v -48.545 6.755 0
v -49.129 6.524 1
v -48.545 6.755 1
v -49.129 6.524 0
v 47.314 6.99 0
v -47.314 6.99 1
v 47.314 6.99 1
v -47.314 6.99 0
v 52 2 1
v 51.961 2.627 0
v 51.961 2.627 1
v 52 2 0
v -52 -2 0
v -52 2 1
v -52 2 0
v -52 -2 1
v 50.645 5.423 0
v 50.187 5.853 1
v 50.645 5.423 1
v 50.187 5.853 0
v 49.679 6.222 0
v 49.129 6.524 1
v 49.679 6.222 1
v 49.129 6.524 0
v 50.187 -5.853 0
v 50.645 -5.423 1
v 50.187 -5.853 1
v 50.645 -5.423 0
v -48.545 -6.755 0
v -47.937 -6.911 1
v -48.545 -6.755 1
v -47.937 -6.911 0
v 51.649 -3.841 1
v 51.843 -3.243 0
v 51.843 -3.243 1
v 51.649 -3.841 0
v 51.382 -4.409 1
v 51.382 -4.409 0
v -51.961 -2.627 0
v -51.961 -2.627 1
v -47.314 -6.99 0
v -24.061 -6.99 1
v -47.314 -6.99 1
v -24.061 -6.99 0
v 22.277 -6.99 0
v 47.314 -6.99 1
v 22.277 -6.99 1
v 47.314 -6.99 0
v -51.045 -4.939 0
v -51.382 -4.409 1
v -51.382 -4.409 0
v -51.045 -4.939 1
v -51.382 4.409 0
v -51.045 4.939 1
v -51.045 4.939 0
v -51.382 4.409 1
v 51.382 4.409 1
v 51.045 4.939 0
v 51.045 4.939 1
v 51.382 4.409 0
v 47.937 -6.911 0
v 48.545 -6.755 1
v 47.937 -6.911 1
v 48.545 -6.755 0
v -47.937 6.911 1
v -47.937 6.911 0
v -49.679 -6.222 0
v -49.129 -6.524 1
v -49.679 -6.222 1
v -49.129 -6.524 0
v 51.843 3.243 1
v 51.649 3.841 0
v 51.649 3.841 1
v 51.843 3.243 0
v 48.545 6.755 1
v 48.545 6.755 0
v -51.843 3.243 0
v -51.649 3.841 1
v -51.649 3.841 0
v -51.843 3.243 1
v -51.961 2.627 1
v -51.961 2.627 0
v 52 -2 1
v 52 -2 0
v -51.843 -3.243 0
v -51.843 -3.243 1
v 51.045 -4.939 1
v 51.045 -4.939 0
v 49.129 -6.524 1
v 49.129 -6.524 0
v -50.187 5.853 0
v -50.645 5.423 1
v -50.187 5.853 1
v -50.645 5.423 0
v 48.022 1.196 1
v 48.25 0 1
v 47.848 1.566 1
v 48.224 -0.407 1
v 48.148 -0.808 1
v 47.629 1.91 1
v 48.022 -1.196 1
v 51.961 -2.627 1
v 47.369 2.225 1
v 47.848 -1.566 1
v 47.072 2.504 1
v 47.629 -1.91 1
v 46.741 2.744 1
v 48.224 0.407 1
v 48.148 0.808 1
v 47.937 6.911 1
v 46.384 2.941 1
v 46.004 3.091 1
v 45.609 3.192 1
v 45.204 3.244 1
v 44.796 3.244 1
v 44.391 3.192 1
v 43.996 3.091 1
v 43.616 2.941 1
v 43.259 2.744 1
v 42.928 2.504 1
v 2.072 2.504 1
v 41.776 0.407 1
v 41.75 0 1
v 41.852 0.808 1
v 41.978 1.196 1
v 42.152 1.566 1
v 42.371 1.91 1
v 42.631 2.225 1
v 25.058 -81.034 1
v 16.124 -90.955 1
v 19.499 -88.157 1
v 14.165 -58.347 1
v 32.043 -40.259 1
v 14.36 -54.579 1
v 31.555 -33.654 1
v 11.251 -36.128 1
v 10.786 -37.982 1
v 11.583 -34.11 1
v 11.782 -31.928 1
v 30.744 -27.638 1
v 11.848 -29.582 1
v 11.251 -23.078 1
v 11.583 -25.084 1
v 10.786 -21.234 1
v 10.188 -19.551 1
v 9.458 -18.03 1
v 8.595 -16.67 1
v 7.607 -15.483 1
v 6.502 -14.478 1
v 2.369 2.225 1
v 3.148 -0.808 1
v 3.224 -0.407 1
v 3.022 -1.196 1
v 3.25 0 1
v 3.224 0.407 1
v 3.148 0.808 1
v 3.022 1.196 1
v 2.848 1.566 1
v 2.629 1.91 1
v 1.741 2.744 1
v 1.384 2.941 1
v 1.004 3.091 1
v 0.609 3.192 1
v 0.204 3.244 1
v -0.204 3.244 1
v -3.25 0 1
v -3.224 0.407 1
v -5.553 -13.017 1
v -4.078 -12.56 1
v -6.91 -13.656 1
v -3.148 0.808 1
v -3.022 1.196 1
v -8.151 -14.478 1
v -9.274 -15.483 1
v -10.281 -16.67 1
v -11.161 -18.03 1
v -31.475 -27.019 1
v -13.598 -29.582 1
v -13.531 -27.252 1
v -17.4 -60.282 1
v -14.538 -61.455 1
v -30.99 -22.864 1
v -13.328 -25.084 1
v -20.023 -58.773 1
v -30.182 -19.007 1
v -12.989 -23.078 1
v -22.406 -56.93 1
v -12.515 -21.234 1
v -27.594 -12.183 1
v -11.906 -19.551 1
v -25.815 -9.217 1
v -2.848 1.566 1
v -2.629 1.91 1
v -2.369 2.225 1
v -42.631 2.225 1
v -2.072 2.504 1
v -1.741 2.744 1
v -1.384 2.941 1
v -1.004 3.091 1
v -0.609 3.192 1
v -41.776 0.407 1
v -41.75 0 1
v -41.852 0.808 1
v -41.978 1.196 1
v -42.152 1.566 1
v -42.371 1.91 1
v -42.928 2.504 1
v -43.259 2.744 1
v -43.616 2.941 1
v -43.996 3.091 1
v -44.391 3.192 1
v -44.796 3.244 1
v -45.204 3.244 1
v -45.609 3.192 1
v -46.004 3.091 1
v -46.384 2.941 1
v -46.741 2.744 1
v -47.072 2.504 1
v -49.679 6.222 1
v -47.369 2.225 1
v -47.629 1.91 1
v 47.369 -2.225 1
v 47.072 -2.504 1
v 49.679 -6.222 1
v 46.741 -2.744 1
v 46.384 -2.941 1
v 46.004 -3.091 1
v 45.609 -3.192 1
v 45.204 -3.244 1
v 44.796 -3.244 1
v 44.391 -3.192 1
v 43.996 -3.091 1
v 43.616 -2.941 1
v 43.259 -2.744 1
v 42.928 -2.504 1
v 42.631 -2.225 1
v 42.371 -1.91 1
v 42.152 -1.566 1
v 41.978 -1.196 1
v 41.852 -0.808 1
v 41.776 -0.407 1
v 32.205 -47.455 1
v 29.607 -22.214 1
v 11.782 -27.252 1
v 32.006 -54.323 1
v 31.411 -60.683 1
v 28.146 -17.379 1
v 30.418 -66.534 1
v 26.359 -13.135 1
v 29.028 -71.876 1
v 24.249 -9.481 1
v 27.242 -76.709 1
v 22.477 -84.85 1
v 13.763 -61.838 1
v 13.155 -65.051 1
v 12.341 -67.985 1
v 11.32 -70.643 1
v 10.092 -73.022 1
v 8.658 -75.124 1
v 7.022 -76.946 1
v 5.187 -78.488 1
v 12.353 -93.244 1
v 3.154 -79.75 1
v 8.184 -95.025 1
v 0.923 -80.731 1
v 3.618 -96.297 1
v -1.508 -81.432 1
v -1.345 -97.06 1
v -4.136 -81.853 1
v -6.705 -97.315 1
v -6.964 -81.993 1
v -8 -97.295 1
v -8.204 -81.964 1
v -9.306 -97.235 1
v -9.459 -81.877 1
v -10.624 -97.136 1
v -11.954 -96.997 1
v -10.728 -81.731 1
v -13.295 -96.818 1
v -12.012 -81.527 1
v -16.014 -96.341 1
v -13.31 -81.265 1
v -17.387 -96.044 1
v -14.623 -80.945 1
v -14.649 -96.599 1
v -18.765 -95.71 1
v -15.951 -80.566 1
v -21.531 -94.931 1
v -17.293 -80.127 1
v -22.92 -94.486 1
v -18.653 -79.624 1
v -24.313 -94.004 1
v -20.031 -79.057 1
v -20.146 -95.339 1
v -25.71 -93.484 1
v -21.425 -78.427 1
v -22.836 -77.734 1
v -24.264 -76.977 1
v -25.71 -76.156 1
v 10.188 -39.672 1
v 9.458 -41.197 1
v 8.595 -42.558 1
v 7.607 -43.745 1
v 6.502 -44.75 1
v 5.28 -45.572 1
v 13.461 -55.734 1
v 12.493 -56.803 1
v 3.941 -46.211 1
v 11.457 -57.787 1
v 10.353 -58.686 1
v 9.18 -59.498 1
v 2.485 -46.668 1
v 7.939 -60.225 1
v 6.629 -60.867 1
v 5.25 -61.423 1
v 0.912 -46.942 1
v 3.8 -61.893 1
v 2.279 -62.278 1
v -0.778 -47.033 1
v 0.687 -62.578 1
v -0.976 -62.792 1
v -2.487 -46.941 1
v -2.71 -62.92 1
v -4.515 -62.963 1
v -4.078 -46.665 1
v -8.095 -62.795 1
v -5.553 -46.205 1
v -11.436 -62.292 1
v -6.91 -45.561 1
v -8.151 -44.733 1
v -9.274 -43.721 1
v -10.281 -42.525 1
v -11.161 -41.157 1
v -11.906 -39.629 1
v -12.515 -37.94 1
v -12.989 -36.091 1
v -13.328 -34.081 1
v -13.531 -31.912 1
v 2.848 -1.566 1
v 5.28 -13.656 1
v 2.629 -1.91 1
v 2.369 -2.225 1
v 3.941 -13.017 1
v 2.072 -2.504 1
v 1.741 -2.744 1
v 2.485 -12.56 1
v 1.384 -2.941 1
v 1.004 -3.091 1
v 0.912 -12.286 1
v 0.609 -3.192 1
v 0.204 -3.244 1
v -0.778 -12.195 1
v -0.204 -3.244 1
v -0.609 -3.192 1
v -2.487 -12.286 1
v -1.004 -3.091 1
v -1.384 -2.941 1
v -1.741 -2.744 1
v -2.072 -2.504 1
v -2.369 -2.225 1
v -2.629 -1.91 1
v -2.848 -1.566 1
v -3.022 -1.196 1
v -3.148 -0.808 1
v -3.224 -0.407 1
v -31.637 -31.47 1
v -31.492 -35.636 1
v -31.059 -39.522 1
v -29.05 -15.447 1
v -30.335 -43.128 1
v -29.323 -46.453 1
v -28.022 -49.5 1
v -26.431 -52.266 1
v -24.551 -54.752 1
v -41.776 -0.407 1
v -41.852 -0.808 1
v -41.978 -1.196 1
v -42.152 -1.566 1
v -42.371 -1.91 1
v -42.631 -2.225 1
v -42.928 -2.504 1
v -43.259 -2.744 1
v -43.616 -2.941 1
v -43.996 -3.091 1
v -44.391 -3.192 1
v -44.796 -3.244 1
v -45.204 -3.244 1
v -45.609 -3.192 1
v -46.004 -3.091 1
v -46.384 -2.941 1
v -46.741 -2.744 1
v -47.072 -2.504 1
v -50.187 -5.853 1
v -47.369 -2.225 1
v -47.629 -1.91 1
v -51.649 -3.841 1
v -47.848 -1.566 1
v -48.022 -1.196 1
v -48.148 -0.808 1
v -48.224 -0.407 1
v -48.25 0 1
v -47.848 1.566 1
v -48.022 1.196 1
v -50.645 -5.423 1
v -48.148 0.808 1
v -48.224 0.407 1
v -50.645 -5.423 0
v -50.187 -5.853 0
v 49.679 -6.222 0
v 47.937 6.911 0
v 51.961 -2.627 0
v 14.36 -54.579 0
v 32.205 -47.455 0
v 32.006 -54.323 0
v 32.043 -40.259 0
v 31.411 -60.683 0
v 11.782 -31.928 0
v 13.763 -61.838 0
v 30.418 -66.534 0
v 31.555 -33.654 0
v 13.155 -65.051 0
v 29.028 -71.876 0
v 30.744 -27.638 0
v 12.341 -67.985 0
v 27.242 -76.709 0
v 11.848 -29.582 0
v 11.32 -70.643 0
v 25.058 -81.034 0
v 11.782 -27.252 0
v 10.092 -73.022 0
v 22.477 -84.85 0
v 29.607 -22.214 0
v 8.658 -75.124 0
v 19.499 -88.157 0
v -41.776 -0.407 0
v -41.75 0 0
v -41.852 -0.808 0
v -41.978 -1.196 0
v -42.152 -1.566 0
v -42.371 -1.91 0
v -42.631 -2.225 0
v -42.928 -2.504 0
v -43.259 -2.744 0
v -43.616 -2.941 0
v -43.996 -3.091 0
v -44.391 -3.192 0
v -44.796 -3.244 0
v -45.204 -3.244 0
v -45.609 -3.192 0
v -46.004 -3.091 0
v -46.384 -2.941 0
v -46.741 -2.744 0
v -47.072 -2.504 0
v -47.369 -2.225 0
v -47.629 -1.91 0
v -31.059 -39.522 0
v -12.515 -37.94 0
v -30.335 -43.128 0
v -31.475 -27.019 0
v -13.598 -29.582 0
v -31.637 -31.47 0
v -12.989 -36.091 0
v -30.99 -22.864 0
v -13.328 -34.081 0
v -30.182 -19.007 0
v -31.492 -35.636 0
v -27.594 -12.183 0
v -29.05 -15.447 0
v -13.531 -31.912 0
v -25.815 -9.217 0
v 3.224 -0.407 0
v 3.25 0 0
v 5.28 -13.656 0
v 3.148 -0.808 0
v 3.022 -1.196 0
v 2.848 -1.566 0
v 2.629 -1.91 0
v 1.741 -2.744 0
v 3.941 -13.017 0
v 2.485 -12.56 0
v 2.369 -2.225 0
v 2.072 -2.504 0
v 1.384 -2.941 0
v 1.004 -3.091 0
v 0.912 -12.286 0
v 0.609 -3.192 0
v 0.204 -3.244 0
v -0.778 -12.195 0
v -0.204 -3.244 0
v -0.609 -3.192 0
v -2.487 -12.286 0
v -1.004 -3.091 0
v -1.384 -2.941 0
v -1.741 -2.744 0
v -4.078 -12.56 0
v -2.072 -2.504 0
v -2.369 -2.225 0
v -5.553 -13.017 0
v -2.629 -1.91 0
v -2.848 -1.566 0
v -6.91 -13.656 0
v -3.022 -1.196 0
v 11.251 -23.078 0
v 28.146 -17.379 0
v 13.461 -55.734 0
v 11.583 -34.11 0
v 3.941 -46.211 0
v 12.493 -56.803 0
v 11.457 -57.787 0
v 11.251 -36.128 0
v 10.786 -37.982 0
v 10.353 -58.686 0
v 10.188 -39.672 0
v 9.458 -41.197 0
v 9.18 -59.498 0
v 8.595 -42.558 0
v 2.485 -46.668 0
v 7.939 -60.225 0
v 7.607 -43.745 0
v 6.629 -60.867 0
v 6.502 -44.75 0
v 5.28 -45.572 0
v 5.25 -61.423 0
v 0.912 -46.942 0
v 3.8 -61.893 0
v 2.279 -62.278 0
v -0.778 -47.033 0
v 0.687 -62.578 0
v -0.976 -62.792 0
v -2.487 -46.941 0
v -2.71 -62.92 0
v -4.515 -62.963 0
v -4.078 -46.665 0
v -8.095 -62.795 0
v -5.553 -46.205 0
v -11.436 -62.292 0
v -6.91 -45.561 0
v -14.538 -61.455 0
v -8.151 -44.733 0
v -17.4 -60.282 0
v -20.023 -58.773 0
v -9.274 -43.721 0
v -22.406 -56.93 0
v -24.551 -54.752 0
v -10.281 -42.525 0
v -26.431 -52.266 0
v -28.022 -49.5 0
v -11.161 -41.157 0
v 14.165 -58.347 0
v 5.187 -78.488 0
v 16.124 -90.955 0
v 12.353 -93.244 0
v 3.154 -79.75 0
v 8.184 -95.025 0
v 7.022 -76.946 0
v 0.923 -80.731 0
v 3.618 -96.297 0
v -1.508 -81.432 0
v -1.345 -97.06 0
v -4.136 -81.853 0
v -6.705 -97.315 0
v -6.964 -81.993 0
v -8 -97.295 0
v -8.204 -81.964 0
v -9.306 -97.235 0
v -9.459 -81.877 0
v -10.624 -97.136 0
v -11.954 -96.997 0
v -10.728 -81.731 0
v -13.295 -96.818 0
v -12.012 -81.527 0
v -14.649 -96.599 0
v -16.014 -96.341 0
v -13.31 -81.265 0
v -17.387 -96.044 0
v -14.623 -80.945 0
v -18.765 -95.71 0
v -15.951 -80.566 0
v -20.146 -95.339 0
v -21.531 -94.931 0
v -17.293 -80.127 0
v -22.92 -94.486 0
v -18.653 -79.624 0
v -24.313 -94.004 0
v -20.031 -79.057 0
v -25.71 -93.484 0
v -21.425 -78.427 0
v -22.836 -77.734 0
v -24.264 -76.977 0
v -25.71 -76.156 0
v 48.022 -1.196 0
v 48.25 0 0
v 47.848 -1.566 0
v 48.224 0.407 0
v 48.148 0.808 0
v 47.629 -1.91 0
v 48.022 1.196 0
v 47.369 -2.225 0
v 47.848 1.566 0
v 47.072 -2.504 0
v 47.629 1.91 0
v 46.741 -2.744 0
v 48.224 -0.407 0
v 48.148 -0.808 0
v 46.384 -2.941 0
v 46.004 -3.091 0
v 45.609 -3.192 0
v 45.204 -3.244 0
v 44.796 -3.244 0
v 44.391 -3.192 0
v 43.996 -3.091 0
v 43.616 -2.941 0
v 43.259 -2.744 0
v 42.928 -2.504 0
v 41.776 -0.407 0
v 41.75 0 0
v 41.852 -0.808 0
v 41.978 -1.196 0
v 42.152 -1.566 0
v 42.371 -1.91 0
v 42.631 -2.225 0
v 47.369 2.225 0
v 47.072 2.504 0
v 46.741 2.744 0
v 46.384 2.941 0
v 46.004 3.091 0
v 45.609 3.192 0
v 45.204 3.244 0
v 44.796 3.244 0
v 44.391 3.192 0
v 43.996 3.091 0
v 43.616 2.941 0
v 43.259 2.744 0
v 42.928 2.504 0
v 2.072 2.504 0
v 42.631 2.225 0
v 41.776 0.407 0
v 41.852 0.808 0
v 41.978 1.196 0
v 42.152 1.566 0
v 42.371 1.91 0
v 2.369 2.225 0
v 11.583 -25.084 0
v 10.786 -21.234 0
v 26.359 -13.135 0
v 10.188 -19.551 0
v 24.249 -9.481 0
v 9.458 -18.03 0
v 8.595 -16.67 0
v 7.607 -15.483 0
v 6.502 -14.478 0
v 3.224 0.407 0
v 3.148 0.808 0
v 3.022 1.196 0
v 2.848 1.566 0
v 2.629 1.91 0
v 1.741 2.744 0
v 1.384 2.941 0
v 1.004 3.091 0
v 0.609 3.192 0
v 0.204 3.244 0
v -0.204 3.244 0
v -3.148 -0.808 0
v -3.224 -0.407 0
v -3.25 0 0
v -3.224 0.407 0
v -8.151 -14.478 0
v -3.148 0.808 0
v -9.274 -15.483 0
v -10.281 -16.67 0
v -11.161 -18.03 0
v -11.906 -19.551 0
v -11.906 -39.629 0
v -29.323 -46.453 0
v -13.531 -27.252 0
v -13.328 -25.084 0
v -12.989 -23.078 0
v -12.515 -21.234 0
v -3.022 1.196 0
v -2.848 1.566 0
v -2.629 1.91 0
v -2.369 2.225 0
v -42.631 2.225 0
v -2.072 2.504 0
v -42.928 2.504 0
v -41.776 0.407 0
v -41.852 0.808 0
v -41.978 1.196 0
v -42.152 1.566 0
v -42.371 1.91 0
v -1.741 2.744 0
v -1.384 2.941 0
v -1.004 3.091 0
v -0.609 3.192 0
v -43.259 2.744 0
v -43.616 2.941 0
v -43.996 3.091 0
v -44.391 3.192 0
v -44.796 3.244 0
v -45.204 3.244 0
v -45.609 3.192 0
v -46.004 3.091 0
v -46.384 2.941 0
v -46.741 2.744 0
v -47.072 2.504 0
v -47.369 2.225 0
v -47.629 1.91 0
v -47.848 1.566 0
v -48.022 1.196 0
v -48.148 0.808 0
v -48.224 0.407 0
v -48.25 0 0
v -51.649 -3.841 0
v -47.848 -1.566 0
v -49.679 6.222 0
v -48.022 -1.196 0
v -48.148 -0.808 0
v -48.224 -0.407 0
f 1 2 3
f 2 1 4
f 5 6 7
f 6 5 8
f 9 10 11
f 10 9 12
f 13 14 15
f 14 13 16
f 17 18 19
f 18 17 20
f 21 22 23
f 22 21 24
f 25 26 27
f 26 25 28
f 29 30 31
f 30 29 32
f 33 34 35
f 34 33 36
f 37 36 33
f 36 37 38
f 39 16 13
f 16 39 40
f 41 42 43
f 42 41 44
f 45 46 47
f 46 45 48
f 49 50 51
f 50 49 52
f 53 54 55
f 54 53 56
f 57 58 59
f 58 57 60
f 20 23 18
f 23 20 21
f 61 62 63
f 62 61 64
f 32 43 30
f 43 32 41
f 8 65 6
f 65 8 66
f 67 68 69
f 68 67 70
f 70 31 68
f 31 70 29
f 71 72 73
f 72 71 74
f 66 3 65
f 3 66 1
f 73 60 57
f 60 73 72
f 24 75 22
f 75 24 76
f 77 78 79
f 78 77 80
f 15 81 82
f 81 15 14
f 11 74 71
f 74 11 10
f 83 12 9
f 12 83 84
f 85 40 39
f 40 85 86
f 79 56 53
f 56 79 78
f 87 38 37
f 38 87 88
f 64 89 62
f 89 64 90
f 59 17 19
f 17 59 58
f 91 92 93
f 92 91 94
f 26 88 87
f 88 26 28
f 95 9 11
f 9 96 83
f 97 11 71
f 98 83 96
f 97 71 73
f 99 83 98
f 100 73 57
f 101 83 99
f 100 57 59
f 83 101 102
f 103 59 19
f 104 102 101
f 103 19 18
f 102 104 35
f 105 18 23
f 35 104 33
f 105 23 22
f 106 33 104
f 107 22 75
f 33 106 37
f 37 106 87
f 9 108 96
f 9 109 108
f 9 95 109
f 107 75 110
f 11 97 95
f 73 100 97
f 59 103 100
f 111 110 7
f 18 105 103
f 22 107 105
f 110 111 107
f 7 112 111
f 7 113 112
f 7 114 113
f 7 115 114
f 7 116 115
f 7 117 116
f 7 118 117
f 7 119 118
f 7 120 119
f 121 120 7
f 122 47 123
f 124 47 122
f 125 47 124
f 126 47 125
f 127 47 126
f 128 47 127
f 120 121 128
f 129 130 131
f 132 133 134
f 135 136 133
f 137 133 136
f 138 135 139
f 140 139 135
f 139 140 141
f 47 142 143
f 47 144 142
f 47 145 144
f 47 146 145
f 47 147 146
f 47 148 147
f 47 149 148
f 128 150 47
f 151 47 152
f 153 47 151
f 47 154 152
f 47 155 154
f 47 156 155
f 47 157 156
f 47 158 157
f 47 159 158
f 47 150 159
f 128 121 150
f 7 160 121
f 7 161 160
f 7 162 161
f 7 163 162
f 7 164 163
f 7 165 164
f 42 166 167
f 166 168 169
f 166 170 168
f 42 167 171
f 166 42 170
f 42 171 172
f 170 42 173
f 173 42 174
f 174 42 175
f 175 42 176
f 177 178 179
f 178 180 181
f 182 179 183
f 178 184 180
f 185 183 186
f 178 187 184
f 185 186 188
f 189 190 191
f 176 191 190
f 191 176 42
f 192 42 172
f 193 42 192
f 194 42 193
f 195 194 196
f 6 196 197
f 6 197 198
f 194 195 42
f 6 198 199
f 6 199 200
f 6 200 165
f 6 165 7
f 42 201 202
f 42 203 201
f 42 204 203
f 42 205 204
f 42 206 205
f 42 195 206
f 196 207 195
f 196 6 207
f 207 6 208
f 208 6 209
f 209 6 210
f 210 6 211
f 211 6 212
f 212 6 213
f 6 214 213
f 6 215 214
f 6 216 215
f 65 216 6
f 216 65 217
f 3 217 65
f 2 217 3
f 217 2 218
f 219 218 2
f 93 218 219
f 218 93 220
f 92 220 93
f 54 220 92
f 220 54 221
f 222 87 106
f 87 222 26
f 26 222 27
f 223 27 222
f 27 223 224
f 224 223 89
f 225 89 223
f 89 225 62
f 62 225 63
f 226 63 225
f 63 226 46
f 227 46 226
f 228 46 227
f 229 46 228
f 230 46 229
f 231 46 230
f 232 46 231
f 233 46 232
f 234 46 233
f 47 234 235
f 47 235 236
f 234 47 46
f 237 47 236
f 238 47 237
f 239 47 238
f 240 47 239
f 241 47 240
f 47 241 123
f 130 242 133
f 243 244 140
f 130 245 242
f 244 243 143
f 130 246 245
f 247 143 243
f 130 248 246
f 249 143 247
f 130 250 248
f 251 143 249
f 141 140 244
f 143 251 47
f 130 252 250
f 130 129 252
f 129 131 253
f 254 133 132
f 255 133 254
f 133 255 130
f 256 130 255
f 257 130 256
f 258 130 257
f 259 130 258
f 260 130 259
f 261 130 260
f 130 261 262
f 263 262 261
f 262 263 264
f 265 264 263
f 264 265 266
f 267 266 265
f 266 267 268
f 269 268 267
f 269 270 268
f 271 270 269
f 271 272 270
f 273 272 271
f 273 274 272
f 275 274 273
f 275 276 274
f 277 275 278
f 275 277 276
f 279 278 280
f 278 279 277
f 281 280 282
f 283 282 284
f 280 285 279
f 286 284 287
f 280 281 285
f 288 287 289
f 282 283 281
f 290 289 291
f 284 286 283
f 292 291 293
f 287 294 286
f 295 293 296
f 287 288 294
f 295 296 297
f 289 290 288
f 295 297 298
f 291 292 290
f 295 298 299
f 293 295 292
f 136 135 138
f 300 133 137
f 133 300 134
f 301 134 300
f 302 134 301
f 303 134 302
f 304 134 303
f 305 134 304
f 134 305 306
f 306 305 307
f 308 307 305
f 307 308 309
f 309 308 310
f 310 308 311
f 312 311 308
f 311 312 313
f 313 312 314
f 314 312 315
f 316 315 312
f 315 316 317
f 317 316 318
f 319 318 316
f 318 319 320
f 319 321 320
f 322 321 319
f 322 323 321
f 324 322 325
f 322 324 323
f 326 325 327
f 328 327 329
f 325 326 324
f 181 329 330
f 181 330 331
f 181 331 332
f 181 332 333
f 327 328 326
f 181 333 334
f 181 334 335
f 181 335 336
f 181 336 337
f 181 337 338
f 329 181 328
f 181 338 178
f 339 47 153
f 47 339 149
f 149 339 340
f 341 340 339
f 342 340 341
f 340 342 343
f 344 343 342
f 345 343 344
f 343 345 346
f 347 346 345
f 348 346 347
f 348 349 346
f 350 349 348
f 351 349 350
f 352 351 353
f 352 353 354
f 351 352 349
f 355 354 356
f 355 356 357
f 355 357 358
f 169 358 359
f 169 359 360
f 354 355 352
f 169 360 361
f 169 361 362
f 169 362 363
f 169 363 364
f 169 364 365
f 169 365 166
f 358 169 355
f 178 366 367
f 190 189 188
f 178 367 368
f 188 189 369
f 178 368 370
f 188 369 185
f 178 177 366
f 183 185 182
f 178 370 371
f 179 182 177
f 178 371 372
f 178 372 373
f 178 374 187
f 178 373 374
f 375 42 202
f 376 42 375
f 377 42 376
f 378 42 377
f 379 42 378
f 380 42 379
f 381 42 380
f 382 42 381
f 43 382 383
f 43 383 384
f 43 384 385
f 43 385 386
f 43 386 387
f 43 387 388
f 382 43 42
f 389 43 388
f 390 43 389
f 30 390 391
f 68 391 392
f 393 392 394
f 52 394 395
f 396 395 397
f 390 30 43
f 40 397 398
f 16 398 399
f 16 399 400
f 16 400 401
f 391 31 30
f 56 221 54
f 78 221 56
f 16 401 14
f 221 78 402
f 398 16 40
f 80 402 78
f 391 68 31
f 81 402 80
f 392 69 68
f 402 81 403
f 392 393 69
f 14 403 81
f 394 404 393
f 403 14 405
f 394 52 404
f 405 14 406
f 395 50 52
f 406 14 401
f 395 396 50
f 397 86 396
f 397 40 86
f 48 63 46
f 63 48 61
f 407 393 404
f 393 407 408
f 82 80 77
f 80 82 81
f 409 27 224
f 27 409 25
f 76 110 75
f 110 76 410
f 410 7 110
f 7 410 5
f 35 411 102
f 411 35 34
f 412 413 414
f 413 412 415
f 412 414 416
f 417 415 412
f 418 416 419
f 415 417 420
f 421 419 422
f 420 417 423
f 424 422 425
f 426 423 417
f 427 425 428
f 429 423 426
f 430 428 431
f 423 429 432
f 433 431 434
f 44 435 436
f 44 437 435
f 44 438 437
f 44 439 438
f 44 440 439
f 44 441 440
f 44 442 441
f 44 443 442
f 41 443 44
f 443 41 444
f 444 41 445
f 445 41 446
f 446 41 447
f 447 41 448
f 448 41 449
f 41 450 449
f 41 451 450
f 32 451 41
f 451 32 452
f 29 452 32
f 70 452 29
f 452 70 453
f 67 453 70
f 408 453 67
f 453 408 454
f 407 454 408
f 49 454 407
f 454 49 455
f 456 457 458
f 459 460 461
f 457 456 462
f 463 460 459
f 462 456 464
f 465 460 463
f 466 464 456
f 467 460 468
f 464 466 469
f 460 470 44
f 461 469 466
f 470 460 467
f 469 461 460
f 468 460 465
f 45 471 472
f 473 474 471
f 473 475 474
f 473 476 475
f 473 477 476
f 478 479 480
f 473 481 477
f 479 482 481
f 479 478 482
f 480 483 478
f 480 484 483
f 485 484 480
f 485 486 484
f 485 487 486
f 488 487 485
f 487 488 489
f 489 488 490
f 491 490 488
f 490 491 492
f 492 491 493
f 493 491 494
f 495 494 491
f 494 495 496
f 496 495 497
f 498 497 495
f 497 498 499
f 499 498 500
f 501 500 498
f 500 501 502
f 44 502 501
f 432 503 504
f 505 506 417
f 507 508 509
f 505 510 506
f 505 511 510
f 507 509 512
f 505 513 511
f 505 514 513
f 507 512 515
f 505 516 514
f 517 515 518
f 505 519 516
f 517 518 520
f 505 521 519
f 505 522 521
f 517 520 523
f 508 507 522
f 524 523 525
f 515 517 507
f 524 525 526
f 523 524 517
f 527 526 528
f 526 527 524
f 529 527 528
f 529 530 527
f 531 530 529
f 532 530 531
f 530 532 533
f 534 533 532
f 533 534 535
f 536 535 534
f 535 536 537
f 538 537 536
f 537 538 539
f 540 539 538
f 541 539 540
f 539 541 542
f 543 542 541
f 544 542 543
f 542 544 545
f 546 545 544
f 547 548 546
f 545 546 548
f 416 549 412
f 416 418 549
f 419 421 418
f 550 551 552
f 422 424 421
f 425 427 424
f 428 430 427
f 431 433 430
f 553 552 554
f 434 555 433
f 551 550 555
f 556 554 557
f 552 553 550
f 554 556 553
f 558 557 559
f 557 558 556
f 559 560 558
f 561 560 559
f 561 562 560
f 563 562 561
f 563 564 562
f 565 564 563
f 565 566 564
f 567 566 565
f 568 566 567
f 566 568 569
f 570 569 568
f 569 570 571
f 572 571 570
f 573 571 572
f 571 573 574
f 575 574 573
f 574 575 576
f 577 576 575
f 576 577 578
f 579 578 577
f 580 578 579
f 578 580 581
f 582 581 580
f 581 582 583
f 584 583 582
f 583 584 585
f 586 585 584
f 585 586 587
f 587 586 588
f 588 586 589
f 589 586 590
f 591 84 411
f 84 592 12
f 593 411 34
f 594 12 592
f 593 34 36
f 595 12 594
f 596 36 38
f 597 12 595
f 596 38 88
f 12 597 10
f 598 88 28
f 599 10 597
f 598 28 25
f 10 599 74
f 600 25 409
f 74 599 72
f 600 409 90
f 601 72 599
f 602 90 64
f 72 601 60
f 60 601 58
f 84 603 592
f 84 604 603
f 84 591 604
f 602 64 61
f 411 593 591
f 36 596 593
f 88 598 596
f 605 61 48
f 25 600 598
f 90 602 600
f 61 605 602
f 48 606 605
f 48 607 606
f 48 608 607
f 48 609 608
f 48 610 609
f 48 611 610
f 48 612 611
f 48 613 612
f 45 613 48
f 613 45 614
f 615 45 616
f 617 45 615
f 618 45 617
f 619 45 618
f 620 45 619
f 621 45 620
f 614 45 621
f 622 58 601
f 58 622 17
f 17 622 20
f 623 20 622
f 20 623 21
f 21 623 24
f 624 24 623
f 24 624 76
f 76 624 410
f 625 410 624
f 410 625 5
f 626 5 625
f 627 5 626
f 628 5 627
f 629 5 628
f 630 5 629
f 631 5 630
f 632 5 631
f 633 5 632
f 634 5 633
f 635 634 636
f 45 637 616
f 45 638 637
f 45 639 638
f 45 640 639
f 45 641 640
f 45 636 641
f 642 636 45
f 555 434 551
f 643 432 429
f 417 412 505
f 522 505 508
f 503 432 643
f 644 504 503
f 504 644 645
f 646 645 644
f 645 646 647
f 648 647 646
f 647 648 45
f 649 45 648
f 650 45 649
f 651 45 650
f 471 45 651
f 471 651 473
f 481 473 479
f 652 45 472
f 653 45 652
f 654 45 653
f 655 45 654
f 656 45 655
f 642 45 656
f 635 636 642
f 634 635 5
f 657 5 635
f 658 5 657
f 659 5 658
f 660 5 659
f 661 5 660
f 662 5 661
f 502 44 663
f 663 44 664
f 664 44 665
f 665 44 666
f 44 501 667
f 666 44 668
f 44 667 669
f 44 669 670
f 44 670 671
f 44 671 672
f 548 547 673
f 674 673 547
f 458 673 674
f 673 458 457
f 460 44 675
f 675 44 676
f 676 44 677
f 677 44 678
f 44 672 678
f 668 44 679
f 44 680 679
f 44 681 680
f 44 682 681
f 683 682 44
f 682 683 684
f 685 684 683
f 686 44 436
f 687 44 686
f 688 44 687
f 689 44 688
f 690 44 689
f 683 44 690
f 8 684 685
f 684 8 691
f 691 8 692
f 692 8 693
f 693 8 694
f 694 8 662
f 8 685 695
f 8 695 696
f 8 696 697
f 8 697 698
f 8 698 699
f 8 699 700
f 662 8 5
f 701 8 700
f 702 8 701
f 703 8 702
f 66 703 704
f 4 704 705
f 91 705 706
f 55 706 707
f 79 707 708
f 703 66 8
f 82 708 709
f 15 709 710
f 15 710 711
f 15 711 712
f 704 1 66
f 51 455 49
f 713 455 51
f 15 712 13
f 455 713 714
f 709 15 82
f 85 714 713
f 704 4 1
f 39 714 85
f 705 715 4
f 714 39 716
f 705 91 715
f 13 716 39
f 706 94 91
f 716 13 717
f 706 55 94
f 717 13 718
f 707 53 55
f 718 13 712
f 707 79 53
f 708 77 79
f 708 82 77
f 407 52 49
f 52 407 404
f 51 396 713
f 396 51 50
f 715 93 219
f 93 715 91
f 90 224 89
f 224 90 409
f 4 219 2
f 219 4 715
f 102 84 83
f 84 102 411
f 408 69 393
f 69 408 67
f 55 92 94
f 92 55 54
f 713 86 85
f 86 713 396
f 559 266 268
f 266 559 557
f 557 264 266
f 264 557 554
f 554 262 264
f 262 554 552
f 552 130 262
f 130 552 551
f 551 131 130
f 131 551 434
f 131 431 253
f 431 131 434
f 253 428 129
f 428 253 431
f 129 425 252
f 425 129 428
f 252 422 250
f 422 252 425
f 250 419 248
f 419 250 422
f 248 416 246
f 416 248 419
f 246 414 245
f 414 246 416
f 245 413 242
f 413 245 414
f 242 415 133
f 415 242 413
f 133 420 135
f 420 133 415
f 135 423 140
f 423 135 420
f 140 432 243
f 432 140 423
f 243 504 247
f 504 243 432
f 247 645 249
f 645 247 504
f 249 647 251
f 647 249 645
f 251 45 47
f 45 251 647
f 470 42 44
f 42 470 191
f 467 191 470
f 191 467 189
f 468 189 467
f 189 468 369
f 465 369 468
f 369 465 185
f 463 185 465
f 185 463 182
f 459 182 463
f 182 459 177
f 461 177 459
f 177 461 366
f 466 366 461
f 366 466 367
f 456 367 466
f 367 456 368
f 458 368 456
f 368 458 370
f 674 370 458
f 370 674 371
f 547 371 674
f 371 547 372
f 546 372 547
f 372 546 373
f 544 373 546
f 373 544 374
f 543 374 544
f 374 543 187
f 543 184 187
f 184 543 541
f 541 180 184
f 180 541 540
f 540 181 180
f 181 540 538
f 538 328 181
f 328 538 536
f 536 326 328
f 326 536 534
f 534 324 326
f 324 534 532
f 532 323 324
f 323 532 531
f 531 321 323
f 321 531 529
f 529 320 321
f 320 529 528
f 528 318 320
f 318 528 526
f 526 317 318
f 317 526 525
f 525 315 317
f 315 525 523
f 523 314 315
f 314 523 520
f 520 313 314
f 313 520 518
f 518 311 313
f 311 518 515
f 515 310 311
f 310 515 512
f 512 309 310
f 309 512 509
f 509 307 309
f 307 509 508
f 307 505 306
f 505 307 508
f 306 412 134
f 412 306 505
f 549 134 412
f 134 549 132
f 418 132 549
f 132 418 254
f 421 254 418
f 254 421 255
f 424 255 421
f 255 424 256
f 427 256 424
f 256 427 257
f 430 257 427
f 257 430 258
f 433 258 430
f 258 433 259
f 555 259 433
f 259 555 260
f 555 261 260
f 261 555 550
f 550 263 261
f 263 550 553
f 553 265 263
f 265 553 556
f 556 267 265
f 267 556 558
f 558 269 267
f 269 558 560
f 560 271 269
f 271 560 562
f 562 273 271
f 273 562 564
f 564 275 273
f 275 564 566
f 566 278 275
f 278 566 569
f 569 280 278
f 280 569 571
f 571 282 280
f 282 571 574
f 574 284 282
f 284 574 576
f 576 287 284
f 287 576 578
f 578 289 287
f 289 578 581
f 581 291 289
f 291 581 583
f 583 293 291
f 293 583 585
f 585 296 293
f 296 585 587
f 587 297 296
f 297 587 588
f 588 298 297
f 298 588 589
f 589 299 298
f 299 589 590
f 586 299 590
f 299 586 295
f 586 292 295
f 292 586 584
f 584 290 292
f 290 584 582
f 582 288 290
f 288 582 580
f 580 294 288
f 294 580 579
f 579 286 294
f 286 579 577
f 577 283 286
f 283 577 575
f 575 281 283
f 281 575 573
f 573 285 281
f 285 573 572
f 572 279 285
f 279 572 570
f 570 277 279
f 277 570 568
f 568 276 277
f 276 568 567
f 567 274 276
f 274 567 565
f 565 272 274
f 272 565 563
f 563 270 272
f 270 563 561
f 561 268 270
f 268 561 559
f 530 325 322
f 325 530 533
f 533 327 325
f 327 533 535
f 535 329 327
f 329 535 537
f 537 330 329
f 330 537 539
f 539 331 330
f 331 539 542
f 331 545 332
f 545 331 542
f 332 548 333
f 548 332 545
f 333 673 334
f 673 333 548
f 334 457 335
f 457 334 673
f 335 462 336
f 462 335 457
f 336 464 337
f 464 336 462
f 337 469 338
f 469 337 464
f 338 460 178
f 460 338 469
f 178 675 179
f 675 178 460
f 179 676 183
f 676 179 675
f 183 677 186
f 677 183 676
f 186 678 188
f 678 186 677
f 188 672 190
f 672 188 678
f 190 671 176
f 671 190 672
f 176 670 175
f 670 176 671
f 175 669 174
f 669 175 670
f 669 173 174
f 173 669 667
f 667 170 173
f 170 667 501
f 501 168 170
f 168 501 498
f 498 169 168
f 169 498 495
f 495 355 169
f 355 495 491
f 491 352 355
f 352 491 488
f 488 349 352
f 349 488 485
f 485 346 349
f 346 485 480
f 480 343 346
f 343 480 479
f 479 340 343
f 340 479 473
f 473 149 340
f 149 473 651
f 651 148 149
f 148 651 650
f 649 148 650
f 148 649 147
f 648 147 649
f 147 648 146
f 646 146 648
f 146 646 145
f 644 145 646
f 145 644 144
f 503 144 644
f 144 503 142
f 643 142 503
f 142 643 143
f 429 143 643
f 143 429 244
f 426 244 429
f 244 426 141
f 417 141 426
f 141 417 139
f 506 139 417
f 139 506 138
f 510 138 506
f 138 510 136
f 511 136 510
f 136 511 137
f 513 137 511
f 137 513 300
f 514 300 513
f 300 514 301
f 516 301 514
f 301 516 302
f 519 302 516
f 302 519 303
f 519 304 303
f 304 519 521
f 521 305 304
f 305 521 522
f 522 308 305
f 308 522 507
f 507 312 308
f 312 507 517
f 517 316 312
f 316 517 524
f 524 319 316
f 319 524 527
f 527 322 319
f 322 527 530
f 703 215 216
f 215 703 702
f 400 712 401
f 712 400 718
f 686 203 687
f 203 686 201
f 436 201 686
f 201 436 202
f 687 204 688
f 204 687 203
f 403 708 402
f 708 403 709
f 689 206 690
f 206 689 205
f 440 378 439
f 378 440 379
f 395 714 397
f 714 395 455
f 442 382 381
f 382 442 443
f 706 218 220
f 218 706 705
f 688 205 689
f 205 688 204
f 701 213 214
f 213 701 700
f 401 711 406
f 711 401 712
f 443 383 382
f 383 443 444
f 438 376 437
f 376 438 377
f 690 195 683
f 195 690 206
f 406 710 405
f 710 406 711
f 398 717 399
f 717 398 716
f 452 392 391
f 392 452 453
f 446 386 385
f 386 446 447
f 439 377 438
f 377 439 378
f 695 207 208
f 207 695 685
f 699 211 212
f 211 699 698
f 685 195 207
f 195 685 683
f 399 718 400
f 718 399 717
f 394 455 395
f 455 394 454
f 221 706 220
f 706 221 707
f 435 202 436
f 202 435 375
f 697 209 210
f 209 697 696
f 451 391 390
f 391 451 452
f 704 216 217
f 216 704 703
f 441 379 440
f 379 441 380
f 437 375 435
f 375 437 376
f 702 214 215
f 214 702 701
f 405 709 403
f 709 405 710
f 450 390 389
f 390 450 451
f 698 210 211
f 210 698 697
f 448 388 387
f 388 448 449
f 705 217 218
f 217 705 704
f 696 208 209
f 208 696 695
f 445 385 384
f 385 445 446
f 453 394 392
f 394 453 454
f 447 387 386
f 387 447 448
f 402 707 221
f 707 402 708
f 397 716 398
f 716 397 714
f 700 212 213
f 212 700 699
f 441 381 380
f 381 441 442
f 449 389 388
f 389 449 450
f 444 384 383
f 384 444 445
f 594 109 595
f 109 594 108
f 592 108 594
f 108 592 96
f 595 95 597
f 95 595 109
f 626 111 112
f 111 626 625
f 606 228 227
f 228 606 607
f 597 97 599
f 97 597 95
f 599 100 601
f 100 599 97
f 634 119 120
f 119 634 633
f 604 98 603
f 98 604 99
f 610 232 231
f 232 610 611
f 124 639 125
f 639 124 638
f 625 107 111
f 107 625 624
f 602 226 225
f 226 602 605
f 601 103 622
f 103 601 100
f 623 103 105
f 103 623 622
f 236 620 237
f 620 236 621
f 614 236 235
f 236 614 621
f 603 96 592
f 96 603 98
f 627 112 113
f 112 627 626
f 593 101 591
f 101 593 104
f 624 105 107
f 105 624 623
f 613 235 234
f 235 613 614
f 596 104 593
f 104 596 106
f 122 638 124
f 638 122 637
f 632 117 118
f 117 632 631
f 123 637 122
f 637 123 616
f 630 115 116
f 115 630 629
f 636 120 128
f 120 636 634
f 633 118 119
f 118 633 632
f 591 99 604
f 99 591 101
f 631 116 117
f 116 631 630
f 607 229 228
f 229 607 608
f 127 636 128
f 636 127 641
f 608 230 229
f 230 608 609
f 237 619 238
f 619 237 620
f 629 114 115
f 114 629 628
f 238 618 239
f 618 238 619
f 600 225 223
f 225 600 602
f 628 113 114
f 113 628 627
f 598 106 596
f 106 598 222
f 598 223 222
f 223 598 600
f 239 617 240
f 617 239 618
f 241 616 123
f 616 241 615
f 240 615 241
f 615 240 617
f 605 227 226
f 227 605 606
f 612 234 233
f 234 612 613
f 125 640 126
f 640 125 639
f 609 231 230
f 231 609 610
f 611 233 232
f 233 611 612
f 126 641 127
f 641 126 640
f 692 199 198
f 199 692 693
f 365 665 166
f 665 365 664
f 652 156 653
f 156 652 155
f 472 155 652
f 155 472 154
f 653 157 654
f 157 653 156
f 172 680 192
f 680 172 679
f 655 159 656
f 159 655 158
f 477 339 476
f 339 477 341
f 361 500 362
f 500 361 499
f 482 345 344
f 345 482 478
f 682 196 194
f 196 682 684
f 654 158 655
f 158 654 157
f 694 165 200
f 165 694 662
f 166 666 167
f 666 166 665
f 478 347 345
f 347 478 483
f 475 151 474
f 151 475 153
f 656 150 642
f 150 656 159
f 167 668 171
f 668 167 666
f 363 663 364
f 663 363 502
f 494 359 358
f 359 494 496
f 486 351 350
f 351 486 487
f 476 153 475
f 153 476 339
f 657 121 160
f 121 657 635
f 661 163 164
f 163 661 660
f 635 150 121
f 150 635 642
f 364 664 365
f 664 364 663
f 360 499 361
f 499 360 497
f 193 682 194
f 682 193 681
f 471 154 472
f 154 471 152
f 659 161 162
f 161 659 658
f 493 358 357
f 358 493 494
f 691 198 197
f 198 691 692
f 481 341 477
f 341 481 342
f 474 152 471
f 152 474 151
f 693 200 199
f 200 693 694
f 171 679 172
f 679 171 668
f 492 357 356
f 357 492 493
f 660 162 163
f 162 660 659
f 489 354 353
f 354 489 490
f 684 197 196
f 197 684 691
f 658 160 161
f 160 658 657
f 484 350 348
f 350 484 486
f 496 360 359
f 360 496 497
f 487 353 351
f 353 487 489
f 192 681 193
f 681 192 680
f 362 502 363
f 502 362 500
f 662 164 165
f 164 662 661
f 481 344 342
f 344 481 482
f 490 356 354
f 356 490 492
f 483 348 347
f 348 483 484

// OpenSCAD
$fn = 50;


difference() {
	union() {
		translate(v = [0, 0, 0]) {
			rotate(a = [0, 0, 0]) {
				hull() {
					translate(v = [-47.0000000000, 2.0000000000, 0]) {
						rotate(a = [0, 0, 0]) {
							translate(v = [0, 0, 0]) {
								rotate(a = [0, 0, 0]) {
									cylinder(h = 1, r = 5);
								}
							}
						}
					}
					translate(v = [47.0000000000, 2.0000000000, 0]) {
						rotate(a = [0, 0, 0]) {
							translate(v = [0, 0, 0]) {
								rotate(a = [0, 0, 0]) {
									cylinder(h = 1, r = 5);
								}
							}
						}
					}
					translate(v = [-47.0000000000, -2.0000000000, 0]) {
						rotate(a = [0, 0, 0]) {
							translate(v = [0, 0, 0]) {
								rotate(a = [0, 0, 0]) {
									cylinder(h = 1, r = 5);
								}
							}
						}
					}
					translate(v = [47.0000000000, -2.0000000000, 0]) {
						rotate(a = [0, 0, 0]) {
							translate(v = [0, 0, 0]) {
								rotate(a = [0, 0, 0]) {
									cylinder(h = 1, r = 5);
								}
							}
						}
					}
				}
			}
		}
		translate(v = [0, 0, 0]) {
			rotate(a = [0, 0, 0]) {
				linear_extrude(height = 1) {
					text(font = "DejaVu Sans Mono:style=Bold", halign = "center", size = 95, text = "9", valign = "top");
				}
			}
		}
	}
	union() {
		translate(v = [-45.0000000000, 0.0000000000, -125.0000000000]) {
			rotate(a = [0, 0, 0]) {
				cylinder(h = 250, r = 3.2500000000);
			}
		}
		translate(v = [45.0000000000, 0.0000000000, -125.0000000000]) {
			rotate(a = [0, 0, 0]) {
				cylinder(h = 250, r = 3.2500000000);
			}
		}
		translate(v = [45.0000000000, 0.0000000000, -125.0000000000]) {
			rotate(a = [0, 0, 0]) {
				cylinder(h = 250, r = 3.2500000000);
			}
		}
		translate(v = [0, 0, -125.0000000000]) {
			rotate(a = [0, 0, 0]) {
				cylinder(h = 250, r = 3.2500000000);
			}
		}
	}
}
